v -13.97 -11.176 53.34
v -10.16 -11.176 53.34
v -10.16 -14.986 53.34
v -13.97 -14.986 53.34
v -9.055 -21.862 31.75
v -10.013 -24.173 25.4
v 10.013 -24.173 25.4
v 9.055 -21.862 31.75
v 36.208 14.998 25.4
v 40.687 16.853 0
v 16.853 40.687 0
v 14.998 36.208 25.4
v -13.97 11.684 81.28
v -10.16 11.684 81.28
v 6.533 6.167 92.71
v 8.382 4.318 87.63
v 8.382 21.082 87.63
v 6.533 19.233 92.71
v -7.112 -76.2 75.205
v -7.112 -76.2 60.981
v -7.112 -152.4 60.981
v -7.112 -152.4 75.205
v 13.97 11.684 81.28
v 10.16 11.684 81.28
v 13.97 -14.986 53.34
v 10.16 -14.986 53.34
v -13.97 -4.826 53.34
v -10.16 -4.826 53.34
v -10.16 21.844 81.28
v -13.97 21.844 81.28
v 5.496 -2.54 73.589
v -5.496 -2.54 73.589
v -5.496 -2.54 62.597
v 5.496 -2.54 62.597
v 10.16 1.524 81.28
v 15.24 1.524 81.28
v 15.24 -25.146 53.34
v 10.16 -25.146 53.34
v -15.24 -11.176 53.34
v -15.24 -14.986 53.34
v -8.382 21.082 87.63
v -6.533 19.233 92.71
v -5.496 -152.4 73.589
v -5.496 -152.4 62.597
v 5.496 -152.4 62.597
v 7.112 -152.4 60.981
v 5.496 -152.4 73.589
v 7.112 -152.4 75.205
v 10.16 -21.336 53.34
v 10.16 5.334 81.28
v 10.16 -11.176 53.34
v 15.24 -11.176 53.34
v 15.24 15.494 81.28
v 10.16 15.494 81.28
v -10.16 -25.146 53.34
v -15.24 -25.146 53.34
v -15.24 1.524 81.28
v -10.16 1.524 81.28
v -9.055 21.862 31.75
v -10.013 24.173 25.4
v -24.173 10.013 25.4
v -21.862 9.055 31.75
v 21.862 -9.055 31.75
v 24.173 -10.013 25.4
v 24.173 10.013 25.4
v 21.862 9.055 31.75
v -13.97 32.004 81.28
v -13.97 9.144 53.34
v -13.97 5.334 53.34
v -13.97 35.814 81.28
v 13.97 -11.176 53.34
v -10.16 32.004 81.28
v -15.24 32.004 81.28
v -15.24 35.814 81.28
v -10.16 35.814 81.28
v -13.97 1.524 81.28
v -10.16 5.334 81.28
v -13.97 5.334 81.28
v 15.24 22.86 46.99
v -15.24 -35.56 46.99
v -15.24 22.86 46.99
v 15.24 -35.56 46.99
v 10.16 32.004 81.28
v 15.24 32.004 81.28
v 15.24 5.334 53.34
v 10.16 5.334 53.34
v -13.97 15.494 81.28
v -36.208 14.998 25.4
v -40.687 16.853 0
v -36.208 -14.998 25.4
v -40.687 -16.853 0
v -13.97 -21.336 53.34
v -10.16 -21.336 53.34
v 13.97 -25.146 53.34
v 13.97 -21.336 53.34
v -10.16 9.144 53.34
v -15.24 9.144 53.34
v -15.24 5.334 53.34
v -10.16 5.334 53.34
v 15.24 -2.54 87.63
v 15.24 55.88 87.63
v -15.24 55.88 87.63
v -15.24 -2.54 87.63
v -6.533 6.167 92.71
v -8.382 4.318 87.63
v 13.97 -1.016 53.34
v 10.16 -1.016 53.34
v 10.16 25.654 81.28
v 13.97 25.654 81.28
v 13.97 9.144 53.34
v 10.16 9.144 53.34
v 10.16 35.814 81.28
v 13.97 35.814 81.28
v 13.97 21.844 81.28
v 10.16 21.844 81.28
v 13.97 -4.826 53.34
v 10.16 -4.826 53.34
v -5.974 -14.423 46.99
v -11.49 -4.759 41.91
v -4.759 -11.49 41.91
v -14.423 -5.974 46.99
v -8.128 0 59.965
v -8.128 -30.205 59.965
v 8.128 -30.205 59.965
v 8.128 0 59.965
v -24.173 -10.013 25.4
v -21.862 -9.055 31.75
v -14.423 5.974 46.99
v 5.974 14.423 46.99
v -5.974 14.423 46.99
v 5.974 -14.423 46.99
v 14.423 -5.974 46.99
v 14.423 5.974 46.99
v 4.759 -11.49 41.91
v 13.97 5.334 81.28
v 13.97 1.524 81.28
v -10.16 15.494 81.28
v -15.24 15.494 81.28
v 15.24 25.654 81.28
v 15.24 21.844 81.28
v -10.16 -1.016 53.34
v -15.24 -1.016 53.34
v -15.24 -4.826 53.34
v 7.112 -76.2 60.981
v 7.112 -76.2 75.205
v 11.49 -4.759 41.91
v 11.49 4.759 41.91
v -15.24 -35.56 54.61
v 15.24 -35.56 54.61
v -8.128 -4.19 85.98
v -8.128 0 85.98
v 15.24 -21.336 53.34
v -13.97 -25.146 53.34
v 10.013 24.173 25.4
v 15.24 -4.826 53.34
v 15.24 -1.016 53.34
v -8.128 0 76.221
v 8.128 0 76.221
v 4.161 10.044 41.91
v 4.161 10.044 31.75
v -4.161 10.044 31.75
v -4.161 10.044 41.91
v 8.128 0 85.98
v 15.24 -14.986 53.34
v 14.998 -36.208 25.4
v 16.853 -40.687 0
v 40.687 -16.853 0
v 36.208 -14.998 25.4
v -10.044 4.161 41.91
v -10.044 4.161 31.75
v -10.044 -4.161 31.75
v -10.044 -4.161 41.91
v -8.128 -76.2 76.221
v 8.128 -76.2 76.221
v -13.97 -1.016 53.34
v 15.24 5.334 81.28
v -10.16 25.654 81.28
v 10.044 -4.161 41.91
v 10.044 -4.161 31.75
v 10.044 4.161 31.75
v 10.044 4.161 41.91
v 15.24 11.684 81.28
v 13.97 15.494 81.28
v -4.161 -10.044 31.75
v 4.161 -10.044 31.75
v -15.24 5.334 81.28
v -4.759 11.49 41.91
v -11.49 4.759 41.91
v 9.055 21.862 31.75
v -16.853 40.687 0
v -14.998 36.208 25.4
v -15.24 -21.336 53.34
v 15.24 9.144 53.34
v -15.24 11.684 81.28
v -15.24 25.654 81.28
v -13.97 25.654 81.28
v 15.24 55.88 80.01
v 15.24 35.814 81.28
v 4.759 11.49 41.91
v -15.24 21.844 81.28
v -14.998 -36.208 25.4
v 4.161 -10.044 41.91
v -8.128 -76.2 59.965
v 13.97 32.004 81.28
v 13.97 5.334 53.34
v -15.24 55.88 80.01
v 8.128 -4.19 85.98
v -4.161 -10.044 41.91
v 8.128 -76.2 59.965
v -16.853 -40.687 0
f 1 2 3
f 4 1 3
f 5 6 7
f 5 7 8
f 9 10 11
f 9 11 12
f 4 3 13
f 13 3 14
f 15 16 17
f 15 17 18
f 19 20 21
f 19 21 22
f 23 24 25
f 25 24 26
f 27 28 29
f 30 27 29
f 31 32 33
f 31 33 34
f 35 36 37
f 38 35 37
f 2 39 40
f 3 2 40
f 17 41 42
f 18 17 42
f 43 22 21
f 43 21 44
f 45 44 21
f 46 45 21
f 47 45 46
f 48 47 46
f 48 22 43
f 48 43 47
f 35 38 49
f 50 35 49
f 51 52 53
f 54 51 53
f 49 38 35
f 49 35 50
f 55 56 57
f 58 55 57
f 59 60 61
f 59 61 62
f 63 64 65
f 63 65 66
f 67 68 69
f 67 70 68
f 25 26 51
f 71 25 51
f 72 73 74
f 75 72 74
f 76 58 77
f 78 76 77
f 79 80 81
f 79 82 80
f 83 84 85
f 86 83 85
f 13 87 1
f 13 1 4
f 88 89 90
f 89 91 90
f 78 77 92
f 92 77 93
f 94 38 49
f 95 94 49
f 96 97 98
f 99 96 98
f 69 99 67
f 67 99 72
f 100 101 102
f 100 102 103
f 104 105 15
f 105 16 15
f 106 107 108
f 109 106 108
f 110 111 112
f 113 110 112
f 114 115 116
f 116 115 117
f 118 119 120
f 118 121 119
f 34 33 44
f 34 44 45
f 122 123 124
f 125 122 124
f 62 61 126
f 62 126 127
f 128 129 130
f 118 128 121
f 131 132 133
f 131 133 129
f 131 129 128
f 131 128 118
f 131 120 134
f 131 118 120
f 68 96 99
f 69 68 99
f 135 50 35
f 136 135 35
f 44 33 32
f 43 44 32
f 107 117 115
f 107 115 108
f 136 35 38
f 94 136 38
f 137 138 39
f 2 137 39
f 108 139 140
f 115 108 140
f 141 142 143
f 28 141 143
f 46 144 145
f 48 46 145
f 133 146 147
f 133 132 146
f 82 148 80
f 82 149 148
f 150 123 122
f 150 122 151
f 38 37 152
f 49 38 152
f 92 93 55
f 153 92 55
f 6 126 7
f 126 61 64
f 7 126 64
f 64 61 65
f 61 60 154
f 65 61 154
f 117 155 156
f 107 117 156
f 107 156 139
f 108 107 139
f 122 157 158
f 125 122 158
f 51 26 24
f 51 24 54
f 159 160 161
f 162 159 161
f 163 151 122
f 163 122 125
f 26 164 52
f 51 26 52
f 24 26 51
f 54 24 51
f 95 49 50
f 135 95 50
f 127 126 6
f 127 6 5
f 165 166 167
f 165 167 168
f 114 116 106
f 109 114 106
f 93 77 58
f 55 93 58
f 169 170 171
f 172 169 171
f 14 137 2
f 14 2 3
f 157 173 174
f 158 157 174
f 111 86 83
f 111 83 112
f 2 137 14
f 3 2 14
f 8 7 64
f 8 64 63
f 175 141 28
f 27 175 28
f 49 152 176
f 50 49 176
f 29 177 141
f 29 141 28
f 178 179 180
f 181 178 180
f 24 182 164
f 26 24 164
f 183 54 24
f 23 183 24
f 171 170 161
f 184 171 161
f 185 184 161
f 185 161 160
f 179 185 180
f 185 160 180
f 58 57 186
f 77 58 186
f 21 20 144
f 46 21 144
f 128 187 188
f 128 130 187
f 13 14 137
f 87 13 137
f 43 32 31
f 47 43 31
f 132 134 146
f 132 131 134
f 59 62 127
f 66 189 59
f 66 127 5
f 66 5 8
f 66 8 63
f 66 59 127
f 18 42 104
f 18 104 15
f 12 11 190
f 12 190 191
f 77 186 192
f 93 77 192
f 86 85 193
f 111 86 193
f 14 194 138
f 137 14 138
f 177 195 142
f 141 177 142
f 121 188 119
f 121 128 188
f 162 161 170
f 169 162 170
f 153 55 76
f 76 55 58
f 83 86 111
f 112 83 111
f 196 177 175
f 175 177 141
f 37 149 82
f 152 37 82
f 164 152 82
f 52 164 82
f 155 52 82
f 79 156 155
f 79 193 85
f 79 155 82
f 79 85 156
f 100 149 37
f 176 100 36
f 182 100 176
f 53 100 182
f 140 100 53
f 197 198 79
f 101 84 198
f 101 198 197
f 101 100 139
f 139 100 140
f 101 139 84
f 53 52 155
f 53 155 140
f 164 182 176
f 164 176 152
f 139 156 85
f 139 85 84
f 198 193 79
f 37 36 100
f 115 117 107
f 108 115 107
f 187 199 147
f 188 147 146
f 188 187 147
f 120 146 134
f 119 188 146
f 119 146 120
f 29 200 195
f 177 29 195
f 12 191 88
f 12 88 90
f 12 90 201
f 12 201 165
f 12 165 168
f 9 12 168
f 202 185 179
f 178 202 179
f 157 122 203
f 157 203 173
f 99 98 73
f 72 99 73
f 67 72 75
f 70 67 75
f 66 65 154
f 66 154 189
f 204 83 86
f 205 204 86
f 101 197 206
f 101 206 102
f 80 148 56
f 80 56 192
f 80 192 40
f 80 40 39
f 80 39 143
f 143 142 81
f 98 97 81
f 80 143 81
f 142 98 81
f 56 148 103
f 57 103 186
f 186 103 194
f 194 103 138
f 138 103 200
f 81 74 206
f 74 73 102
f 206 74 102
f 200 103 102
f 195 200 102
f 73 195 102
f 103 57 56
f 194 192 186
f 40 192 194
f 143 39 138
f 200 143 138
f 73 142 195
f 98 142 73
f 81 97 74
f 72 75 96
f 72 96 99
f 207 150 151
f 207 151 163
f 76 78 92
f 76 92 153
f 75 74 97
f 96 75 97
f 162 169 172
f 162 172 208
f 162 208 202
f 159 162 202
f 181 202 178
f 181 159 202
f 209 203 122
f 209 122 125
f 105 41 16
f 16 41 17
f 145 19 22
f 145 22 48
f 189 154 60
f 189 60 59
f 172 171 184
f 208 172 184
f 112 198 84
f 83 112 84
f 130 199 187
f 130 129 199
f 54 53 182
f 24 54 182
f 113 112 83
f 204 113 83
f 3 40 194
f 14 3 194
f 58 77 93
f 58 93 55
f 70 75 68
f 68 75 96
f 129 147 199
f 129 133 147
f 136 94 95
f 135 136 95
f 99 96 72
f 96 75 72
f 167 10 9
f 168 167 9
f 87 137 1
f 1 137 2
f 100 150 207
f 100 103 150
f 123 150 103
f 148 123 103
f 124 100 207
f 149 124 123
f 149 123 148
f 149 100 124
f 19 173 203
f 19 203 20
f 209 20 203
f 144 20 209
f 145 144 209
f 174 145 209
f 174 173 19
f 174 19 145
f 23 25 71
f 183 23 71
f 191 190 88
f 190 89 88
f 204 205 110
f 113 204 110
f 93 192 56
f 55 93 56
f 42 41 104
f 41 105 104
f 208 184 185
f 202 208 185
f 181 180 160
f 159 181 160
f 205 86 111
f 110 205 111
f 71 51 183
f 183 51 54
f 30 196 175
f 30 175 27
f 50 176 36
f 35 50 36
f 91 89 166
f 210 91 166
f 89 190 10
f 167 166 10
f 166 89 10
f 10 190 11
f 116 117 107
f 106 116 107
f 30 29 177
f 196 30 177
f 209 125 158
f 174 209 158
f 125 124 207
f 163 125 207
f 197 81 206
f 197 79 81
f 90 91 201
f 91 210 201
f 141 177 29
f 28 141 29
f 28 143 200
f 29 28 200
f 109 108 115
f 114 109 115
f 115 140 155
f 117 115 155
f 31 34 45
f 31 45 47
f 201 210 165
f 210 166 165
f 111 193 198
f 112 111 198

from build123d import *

# Parameters (mm, degrees)
F1_DEPTH  = 25.4
F1_TAPER  = 10
F3_DEPTH  = 6.35
F3_TAPER  = 20
F5_DEPTH  = 10.16
F7_DEPTH  = 5.08
F7_TAPER  = -30
F9_DEPTH  = 15.24
F10_W     = 16.256
F10_H     = 26.0146409273
F11_DEPTH = 35.56
F12_W     = 16.256
F12_H     = 16.256
F13_DEPTH = 76.2
F14_W     = 14.224
F14_H     = 14.224
F15_DEPTH = 76.2
F16_W     = 10.9911077964
F16_H     = 10.9911077964
F17_DEPTH = 149.86
F18_W     = 16.764
F18_H     = 16.764
F19_DEPTH = 5.08
F19_TAPER = 20
F21_DEPTH = 5.08
F23_DEPTH = 5.08
F25_DEPTH = 3.81
F27_DEPTH = 3.81


with BuildPart() as f1:
    # F0 (on Top) → F1 (new body)
    with BuildSketch(Plane.XY):
        Polygon((0, 37.1335148811), (0, 0), (40.6867459597, 16.8530019854), (16.8530019854, 40.6867459597), (0, 40.6867459597), align=None)
        Polygon((40.6867459597, 16.8530019854), (0, 0), (0, 37.1335148811), (0, 40.6867459597), (-16.8530019854, 40.6867459597), (-40.6867459597, 16.8530019854), (-40.6867459597, -16.8530019854), (-16.8530019854, -40.6867459597), (16.8530019854, -40.6867459597), (40.6867459597, -16.8530019854), align=None)
    extrude(amount=F1_DEPTH, taper=F1_TAPER)


with BuildPart() as f3:
    # F2 (on face) → F3 (new body)
    with BuildSketch(Plane.XY.offset(25.4)):
        Polygon((10.0126762949, 24.1727389067), (-10.0126762949, 24.1727389067), (-24.1727389067, 10.0126762949), (-24.1727389067, -10.0126762949), (-10.0126762949, -24.1727389067), (10.0126762949, -24.1727389067), (24.1727389067, -10.0126762949), (24.1727389067, 10.0126762949), align=None)
    extrude(amount=F3_DEPTH, taper=F3_TAPER)


with BuildPart() as f5:
    # F4 (on face) → F5 (new body)
    with BuildSketch(Plane.XY.offset(31.75)):
        Polygon((4.1605260419, 10.0443983969), (-4.1605260419, 10.0443983969), (-10.0443983969, 4.1605260419), (-10.0443983969, -4.1605260419), (-4.1605260419, -10.0443983969), (4.1605260419, -10.0443983969), (10.0443983969, -4.1605260419), (10.0443983969, 4.1605260419), align=None)
    extrude(amount=F5_DEPTH)


with BuildPart() as f7:
    # F6 (on face) → F7 (new body)
    with BuildSketch(Plane.XY.offset(41.91)):
        Polygon((4.7593670983, 11.490128597), (-4.7593670983, 11.490128597), (-11.490128597, 4.7593670983), (-11.490128597, -4.7593670983), (-4.7593670983, -11.490128597), (4.7593670983, -11.490128597), (11.490128597, -4.7593670983), (11.490128597, 4.7593670983), align=None)
    extrude(amount=F7_DEPTH, taper=F7_TAPER)


with BuildPart() as f9:
    # F8 (on Right) → F9 (new body, symmetric)
    with BuildSketch(Plane.YZ):
        Polygon((-5.9742303619, 46.99), (5.9742303619, 46.99), (22.86, 46.99), (55.88, 80.01), (55.88, 87.63), (-2.54, 87.63), (-35.56, 54.61), (-35.56, 46.99), align=None)
    extrude(amount=F9_DEPTH, both=True)

    # F10 (on face) → F11 (cut)
    with BuildSketch(Plane.XZ.offset(35.56)):
        with Locations((0, 72.9723498225)):
            Rectangle(F10_W, F10_H)
    extrude(amount=-F11_DEPTH, mode=Mode.SUBTRACT)

    # F20 (on face) → F21 (cut)
    with BuildSketch(Plane.YZ.offset(15.24)):
        Polygon((5.334, 81.28), (1.524, 81.28), (-25.146, 53.34), (-21.336, 53.34), align=None)
        Polygon((15.494, 81.28), (11.684, 81.28), (-14.986, 53.34), (-11.176, 53.34), align=None)
        Polygon((25.654, 81.28), (21.844, 81.28), (-4.826, 53.34), (-1.016, 53.34), align=None)
        Polygon((32.004, 81.28), (5.334, 53.34), (9.144, 53.34), (35.814, 81.28), align=None)
    extrude(amount=-F21_DEPTH, mode=Mode.SUBTRACT)

    # F22 (on face) → F23 (cut)
    with BuildSketch(Plane(origin=(-15.24, 0, 0), x_dir=(0, -1, 0), z_dir=(-1, 0, 0))):
        Polygon((-1.524, 81.28), (-5.334, 81.28), (21.336, 53.34), (25.146, 53.34), align=None)
        Polygon((-11.684, 81.28), (-15.494, 81.28), (11.176, 53.34), (14.986, 53.34), align=None)
        Polygon((-21.844, 81.28), (-25.654, 81.28), (1.016, 53.34), (4.826, 53.34), align=None)
        Polygon((-5.334, 53.34), (-32.004, 81.28), (-35.814, 81.28), (-9.144, 53.34), align=None)
    extrude(amount=-F23_DEPTH, mode=Mode.SUBTRACT)


with BuildPart() as f13:
    # F12 (on face) → F13 (new body)
    with BuildSketch(Plane.XZ):
        with Locations((0, 68.0930293589)):
            Rectangle(F12_W, F12_H)
    extrude(amount=F13_DEPTH)

    # F14 (on face) → F15 (join)
    with BuildSketch(Plane.XZ.offset(76.2)):
        with Locations((0, 68.0930293589)):
            Rectangle(F14_W, F14_H)
    extrude(amount=F15_DEPTH)

    # F16 (on face) → F17 (cut)
    with BuildSketch(Plane.XZ.offset(152.4)):
        with Locations((0, 68.0930293589)):
            Rectangle(F16_W, F16_H)
    extrude(amount=-F17_DEPTH, mode=Mode.SUBTRACT)


with BuildPart() as f19:
    # F18 (on face) → F19 (new body)
    with BuildSketch(Plane.XY.offset(87.63)):
        with Locations((0, 12.7)):
            Rectangle(F18_W, F18_H)
    extrude(amount=F19_DEPTH, taper=F19_TAPER)


with BuildPart() as f25:
    # F24 (on face) → F25 (new body)
    with BuildSketch(Plane(origin=(-10.16, 0, 0), x_dir=(0, -1, 0), z_dir=(-1, 0, 0))):
        Polygon((14.986, 53.34), (-11.684, 81.28), (-15.494, 81.28), (11.176, 53.34), align=None)
    extrude(amount=F25_DEPTH)


with BuildPart() as f25b:
    # F24 (on face) → F25, piece 2 (new body)
    with BuildSketch(Plane(origin=(-10.16, 0, 0), x_dir=(0, -1, 0), z_dir=(-1, 0, 0))):
        Polygon((25.146, 53.34), (-1.524, 81.28), (-5.334, 81.28), (21.336, 53.34), align=None)
    extrude(amount=F25_DEPTH)


with BuildPart() as f25c:
    # F24 (on face) → F25, piece 3 (new body)
    with BuildSketch(Plane(origin=(-10.16, 0, 0), x_dir=(0, -1, 0), z_dir=(-1, 0, 0))):
        Polygon((4.826, 53.34), (-21.844, 81.28), (-25.654, 81.28), (1.016, 53.34), align=None)
    extrude(amount=F25_DEPTH)


with BuildPart() as f25d:
    # F24 (on face) → F25, piece 4 (new body)
    with BuildSketch(Plane(origin=(-10.16, 0, 0), x_dir=(0, -1, 0), z_dir=(-1, 0, 0))):
        Polygon((-9.144, 53.34), (-5.334, 53.34), (-32.004, 81.28), (-35.814, 81.28), align=None)
    extrude(amount=F25_DEPTH)


with BuildPart() as f27:
    # F26 (on face) → F27 (new body)
    with BuildSketch(Plane.YZ.offset(10.16)):
        Polygon((-21.336, 53.34), (5.334, 81.28), (1.524, 81.28), (-25.146, 53.34), align=None)
    extrude(amount=F27_DEPTH)


with BuildPart() as f27b:
    # F26 (on face) → F27, piece 2 (new body)
    with BuildSketch(Plane.YZ.offset(10.16)):
        Polygon((-11.176, 53.34), (15.494, 81.28), (11.684, 81.28), (-14.986, 53.34), align=None)
    extrude(amount=F27_DEPTH)


with BuildPart() as f27c:
    # F26 (on face) → F27, piece 3 (new body)
    with BuildSketch(Plane.YZ.offset(10.16)):
        Polygon((-1.016, 53.34), (25.654, 81.28), (21.844, 81.28), (-4.826, 53.34), align=None)
    extrude(amount=F27_DEPTH)


with BuildPart() as f27d:
    # F26 (on face) → F27, piece 4 (new body)
    with BuildSketch(Plane.YZ.offset(10.16)):
        Polygon((35.814, 81.28), (32.004, 81.28), (5.334, 53.34), (9.144, 53.34), align=None)
    extrude(amount=F27_DEPTH)


solid = Compound([f1.part, f3.part, f5.part, f7.part, f9.part, f13.part, f19.part, f25.part, f25b.part, f25c.part, f25d.part, f27.part, f27b.part, f27c.part, f27d.part])
